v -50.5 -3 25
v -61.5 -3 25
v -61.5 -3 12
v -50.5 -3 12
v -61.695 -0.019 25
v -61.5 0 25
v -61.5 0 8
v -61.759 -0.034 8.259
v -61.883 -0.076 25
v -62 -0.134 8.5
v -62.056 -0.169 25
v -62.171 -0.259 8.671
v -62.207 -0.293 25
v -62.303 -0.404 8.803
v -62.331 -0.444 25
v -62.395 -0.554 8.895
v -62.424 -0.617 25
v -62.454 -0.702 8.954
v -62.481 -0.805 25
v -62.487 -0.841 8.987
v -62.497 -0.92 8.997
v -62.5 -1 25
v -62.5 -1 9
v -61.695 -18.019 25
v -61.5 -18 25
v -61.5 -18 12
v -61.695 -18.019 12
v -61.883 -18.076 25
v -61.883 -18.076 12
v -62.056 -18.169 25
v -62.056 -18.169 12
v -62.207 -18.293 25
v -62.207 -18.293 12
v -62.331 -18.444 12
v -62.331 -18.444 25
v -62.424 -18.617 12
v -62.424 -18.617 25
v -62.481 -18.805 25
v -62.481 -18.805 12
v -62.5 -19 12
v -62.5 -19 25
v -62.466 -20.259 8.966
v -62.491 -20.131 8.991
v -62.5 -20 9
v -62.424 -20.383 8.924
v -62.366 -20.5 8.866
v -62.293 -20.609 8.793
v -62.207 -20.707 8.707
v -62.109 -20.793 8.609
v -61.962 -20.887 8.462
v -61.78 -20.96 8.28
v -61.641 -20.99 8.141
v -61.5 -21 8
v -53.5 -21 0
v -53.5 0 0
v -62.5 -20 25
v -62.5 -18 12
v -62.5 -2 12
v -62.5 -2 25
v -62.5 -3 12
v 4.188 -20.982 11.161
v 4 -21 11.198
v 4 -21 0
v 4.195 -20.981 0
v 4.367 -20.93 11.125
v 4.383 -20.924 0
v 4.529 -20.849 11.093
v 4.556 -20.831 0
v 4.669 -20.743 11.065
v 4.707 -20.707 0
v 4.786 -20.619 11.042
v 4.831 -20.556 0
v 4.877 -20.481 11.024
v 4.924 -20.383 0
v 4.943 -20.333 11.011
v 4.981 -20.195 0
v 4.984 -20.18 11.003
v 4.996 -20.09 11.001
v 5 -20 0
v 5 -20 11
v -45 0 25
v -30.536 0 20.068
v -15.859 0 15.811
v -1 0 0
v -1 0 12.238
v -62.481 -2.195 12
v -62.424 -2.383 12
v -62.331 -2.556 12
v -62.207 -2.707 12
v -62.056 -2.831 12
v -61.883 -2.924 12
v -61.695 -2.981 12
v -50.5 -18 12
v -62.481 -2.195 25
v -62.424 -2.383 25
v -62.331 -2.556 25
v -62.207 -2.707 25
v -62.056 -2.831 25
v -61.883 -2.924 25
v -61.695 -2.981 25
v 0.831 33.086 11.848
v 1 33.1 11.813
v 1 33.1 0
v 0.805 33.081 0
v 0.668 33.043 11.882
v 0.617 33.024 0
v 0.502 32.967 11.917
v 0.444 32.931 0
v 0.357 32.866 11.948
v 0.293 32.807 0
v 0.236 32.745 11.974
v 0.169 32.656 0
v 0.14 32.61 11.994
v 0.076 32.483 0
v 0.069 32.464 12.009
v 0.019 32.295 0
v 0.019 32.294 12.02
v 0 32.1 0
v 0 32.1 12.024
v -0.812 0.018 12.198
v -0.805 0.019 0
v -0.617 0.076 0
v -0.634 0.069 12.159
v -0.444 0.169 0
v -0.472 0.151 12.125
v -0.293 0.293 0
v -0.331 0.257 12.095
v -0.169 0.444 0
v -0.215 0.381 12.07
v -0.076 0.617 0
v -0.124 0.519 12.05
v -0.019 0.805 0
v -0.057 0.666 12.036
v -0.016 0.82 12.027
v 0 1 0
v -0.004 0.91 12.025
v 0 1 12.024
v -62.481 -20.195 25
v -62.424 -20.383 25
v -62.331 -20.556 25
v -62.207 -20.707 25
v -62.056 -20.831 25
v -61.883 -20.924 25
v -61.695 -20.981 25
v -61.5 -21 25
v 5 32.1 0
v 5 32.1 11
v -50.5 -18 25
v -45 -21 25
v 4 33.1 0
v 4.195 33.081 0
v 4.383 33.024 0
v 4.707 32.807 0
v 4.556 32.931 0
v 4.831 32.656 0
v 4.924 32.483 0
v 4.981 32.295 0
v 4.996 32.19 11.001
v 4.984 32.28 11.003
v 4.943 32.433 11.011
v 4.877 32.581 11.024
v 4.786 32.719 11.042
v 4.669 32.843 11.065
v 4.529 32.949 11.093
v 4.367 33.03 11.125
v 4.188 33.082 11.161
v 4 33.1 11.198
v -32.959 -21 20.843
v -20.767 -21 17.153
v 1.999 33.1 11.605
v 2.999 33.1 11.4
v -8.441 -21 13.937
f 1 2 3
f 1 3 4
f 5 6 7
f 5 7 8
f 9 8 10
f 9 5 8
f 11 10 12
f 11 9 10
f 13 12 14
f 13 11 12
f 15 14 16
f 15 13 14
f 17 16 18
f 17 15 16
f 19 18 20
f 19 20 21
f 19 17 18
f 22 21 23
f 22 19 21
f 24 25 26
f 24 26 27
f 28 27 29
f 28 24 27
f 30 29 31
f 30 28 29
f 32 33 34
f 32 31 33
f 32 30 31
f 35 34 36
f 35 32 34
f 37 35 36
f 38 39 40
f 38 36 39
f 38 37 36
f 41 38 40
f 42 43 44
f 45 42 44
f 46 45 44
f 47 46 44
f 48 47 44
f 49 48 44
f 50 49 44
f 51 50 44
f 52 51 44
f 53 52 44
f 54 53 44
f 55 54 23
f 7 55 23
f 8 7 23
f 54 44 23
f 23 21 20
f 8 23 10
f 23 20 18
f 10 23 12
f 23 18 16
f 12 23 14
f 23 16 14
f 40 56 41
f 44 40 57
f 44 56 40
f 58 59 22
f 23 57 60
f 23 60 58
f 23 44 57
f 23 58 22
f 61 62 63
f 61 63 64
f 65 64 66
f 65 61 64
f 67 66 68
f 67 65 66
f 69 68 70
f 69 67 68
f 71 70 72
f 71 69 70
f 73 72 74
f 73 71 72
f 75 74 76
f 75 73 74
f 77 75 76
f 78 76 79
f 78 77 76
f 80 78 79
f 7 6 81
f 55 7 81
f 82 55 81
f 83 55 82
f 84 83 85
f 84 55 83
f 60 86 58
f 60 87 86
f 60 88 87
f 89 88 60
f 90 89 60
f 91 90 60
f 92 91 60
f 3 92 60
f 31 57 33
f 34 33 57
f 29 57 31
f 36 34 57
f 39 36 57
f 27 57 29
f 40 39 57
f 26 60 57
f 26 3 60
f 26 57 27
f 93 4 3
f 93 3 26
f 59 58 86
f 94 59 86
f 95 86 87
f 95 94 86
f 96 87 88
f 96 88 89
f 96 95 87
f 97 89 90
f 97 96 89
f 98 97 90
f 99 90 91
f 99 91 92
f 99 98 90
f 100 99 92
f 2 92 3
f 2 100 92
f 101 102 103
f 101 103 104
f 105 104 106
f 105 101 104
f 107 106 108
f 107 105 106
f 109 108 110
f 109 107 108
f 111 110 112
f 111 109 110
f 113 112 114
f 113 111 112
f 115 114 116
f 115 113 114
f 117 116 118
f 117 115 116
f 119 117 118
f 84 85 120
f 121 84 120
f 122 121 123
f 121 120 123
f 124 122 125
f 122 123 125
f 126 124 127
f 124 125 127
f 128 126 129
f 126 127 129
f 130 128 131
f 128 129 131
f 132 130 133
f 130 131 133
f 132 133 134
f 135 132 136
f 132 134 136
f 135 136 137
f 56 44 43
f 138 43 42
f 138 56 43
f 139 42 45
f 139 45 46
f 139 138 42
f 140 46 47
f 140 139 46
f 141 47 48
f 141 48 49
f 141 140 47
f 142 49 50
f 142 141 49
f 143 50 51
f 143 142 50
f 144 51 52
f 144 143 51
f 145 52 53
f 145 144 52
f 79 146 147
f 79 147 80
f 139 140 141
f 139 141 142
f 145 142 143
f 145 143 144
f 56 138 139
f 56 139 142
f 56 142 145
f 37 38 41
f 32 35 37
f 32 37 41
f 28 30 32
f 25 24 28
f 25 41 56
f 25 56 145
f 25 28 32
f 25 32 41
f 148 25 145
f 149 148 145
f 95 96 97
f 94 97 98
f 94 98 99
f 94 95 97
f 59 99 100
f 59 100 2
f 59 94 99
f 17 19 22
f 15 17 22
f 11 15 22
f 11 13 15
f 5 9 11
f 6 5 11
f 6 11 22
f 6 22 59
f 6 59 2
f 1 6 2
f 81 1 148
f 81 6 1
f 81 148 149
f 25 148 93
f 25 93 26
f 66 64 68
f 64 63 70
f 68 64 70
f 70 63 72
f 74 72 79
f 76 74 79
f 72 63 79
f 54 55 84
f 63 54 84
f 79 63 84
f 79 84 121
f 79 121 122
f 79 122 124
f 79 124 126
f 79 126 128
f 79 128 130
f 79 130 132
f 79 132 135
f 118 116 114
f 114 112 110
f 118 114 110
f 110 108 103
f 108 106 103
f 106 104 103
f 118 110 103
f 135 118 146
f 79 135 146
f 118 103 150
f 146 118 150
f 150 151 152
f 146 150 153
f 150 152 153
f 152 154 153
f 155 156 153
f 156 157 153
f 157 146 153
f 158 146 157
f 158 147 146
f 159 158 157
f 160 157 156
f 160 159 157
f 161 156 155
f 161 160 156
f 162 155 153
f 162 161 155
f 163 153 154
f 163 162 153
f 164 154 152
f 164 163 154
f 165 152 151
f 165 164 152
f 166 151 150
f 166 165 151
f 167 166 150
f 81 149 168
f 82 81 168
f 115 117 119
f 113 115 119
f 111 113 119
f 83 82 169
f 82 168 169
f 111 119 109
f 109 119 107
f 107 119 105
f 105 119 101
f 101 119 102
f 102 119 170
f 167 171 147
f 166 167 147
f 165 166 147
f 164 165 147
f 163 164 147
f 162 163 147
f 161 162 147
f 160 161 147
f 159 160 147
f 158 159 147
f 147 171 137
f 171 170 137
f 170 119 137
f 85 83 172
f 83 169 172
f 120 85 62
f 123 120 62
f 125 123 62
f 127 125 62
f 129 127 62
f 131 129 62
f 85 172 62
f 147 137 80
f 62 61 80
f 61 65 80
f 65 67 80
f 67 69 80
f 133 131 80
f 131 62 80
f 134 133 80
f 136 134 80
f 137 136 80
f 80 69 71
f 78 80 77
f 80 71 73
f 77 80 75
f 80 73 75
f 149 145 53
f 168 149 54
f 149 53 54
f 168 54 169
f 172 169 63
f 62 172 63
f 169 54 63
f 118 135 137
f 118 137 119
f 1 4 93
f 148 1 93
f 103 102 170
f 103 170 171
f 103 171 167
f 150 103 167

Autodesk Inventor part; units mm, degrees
ref_plane "YZ Plane" through (0, 0, 0) normal (1, 0, 0) x (0, 1, 0)
ref_plane "XZ Plane" through (0, 0, 0) normal (0, 1, 0) x (-1, 0, 0)
ref_plane "XY Plane" through (0, 0, 0) normal (0, 0, 1) x (1, 0, 0)
sketch "Szkic1" plane through (0, 0, 0) normal (0, 0, 1) x (1, 0, 0)
  line L0 (0, 0) -> (0, 33.1)
  line L1 (0, 33.1) -> (5, 33.1)
  line L2 (5, 33.1) -> (5, -21)
  line L3 (-62.5, -3) -> (-62.5, 0)
  line L4 (-62.5, 0) -> (0, 0)
  line L5 (-62.5, -3) -> (-50.5, -3)
  line L6 (-50.5, -3) -> (-50.5, -18)
  line L7 (-50.5, -18) -> (-62.5, -18)
  line L8 (-62.5, -18) -> (-62.5, -21)
  line L9 (-62.5, -21) -> (5, -21)
  dimension "d1" = 15
  dimension "d3" = 3
  dimension "d4" = 12
  dimension "d6" = 3
  dimension "d7" = 5
  dimension "d8" = 33.1
  dimension "d9" = 50.5
extrude "Wyciągnięcie proste1" add sketch "Szkic1" along normal blind 25
sketch "Szkic2" plane through (-50.5, -18, 0) normal (-1, 0, 0) x (0, 0, 1)
  line L0 (0, 0) -> (0, 15) construction
  line L1 (0, 0) -> (25, 0) construction
  line L2 (25, 15) -> (25, 0) construction
  line L3 (0, 15) -> (25, 15) construction
  line L4 (0, 15) -> (12, 15)
  line L5 (12, 15) -> (12, 0)
  line L6 (12, 0) -> (0, 0)
  line L7 (0, 0) -> (0, 15)
  point P0 (0, 18)
  dimension "d14" = 13
extrude "Wyciągnięcie proste2" add sketch "Szkic2" along normal up to surface (12 mm away)
chamfer "Faza1" distance 9 angle 45 1 edges at (-62.5, -10.5, 0)
sketch "Szkic4" plane through (-62.5, -21, 25) normal (0, -1, 0) x (1, 0, 0)
  line L0 (0, 0) -> (67.5, 0) construction
  line L1 (62.5, 0) -> (0, 0) construction
  arc A0 (17.5, 0) -> (67.5, -14) centre (131.2021, 309.7932) ccw
  line L2 (67.5, 0) -> (67.5, -25) construction
  line L3 (62.5, -25) -> (67.5, -25) construction
  line L4 (17.5, 0) -> (67.5, 0)
  line L5 (67.5, 0) -> (67.5, -14)
  dimension "d21" = 11
  dimension "d23" = 50
  dimension "d24" = 330
extrude "Wyciągnięcie proste3" cut sketch "Szkic4" against normal up to surface (54.1 mm away)
fillet "Zaokrąglenie1" radius 1 8 edges at (5, -21, 5.5) (0, 0, 6.012) (5, 33.1, 5.5) (0, 33.1, 6.012) (-62.5, 0, 17) (-62.5, -21, 17) (-62.5, -18, 18.5) (-62.5, -3, 18.5)
equation "\"d3\" = d2"
equation "\"d2\" = 3"
properties part number "CH_01_0024_piston_adapter"
